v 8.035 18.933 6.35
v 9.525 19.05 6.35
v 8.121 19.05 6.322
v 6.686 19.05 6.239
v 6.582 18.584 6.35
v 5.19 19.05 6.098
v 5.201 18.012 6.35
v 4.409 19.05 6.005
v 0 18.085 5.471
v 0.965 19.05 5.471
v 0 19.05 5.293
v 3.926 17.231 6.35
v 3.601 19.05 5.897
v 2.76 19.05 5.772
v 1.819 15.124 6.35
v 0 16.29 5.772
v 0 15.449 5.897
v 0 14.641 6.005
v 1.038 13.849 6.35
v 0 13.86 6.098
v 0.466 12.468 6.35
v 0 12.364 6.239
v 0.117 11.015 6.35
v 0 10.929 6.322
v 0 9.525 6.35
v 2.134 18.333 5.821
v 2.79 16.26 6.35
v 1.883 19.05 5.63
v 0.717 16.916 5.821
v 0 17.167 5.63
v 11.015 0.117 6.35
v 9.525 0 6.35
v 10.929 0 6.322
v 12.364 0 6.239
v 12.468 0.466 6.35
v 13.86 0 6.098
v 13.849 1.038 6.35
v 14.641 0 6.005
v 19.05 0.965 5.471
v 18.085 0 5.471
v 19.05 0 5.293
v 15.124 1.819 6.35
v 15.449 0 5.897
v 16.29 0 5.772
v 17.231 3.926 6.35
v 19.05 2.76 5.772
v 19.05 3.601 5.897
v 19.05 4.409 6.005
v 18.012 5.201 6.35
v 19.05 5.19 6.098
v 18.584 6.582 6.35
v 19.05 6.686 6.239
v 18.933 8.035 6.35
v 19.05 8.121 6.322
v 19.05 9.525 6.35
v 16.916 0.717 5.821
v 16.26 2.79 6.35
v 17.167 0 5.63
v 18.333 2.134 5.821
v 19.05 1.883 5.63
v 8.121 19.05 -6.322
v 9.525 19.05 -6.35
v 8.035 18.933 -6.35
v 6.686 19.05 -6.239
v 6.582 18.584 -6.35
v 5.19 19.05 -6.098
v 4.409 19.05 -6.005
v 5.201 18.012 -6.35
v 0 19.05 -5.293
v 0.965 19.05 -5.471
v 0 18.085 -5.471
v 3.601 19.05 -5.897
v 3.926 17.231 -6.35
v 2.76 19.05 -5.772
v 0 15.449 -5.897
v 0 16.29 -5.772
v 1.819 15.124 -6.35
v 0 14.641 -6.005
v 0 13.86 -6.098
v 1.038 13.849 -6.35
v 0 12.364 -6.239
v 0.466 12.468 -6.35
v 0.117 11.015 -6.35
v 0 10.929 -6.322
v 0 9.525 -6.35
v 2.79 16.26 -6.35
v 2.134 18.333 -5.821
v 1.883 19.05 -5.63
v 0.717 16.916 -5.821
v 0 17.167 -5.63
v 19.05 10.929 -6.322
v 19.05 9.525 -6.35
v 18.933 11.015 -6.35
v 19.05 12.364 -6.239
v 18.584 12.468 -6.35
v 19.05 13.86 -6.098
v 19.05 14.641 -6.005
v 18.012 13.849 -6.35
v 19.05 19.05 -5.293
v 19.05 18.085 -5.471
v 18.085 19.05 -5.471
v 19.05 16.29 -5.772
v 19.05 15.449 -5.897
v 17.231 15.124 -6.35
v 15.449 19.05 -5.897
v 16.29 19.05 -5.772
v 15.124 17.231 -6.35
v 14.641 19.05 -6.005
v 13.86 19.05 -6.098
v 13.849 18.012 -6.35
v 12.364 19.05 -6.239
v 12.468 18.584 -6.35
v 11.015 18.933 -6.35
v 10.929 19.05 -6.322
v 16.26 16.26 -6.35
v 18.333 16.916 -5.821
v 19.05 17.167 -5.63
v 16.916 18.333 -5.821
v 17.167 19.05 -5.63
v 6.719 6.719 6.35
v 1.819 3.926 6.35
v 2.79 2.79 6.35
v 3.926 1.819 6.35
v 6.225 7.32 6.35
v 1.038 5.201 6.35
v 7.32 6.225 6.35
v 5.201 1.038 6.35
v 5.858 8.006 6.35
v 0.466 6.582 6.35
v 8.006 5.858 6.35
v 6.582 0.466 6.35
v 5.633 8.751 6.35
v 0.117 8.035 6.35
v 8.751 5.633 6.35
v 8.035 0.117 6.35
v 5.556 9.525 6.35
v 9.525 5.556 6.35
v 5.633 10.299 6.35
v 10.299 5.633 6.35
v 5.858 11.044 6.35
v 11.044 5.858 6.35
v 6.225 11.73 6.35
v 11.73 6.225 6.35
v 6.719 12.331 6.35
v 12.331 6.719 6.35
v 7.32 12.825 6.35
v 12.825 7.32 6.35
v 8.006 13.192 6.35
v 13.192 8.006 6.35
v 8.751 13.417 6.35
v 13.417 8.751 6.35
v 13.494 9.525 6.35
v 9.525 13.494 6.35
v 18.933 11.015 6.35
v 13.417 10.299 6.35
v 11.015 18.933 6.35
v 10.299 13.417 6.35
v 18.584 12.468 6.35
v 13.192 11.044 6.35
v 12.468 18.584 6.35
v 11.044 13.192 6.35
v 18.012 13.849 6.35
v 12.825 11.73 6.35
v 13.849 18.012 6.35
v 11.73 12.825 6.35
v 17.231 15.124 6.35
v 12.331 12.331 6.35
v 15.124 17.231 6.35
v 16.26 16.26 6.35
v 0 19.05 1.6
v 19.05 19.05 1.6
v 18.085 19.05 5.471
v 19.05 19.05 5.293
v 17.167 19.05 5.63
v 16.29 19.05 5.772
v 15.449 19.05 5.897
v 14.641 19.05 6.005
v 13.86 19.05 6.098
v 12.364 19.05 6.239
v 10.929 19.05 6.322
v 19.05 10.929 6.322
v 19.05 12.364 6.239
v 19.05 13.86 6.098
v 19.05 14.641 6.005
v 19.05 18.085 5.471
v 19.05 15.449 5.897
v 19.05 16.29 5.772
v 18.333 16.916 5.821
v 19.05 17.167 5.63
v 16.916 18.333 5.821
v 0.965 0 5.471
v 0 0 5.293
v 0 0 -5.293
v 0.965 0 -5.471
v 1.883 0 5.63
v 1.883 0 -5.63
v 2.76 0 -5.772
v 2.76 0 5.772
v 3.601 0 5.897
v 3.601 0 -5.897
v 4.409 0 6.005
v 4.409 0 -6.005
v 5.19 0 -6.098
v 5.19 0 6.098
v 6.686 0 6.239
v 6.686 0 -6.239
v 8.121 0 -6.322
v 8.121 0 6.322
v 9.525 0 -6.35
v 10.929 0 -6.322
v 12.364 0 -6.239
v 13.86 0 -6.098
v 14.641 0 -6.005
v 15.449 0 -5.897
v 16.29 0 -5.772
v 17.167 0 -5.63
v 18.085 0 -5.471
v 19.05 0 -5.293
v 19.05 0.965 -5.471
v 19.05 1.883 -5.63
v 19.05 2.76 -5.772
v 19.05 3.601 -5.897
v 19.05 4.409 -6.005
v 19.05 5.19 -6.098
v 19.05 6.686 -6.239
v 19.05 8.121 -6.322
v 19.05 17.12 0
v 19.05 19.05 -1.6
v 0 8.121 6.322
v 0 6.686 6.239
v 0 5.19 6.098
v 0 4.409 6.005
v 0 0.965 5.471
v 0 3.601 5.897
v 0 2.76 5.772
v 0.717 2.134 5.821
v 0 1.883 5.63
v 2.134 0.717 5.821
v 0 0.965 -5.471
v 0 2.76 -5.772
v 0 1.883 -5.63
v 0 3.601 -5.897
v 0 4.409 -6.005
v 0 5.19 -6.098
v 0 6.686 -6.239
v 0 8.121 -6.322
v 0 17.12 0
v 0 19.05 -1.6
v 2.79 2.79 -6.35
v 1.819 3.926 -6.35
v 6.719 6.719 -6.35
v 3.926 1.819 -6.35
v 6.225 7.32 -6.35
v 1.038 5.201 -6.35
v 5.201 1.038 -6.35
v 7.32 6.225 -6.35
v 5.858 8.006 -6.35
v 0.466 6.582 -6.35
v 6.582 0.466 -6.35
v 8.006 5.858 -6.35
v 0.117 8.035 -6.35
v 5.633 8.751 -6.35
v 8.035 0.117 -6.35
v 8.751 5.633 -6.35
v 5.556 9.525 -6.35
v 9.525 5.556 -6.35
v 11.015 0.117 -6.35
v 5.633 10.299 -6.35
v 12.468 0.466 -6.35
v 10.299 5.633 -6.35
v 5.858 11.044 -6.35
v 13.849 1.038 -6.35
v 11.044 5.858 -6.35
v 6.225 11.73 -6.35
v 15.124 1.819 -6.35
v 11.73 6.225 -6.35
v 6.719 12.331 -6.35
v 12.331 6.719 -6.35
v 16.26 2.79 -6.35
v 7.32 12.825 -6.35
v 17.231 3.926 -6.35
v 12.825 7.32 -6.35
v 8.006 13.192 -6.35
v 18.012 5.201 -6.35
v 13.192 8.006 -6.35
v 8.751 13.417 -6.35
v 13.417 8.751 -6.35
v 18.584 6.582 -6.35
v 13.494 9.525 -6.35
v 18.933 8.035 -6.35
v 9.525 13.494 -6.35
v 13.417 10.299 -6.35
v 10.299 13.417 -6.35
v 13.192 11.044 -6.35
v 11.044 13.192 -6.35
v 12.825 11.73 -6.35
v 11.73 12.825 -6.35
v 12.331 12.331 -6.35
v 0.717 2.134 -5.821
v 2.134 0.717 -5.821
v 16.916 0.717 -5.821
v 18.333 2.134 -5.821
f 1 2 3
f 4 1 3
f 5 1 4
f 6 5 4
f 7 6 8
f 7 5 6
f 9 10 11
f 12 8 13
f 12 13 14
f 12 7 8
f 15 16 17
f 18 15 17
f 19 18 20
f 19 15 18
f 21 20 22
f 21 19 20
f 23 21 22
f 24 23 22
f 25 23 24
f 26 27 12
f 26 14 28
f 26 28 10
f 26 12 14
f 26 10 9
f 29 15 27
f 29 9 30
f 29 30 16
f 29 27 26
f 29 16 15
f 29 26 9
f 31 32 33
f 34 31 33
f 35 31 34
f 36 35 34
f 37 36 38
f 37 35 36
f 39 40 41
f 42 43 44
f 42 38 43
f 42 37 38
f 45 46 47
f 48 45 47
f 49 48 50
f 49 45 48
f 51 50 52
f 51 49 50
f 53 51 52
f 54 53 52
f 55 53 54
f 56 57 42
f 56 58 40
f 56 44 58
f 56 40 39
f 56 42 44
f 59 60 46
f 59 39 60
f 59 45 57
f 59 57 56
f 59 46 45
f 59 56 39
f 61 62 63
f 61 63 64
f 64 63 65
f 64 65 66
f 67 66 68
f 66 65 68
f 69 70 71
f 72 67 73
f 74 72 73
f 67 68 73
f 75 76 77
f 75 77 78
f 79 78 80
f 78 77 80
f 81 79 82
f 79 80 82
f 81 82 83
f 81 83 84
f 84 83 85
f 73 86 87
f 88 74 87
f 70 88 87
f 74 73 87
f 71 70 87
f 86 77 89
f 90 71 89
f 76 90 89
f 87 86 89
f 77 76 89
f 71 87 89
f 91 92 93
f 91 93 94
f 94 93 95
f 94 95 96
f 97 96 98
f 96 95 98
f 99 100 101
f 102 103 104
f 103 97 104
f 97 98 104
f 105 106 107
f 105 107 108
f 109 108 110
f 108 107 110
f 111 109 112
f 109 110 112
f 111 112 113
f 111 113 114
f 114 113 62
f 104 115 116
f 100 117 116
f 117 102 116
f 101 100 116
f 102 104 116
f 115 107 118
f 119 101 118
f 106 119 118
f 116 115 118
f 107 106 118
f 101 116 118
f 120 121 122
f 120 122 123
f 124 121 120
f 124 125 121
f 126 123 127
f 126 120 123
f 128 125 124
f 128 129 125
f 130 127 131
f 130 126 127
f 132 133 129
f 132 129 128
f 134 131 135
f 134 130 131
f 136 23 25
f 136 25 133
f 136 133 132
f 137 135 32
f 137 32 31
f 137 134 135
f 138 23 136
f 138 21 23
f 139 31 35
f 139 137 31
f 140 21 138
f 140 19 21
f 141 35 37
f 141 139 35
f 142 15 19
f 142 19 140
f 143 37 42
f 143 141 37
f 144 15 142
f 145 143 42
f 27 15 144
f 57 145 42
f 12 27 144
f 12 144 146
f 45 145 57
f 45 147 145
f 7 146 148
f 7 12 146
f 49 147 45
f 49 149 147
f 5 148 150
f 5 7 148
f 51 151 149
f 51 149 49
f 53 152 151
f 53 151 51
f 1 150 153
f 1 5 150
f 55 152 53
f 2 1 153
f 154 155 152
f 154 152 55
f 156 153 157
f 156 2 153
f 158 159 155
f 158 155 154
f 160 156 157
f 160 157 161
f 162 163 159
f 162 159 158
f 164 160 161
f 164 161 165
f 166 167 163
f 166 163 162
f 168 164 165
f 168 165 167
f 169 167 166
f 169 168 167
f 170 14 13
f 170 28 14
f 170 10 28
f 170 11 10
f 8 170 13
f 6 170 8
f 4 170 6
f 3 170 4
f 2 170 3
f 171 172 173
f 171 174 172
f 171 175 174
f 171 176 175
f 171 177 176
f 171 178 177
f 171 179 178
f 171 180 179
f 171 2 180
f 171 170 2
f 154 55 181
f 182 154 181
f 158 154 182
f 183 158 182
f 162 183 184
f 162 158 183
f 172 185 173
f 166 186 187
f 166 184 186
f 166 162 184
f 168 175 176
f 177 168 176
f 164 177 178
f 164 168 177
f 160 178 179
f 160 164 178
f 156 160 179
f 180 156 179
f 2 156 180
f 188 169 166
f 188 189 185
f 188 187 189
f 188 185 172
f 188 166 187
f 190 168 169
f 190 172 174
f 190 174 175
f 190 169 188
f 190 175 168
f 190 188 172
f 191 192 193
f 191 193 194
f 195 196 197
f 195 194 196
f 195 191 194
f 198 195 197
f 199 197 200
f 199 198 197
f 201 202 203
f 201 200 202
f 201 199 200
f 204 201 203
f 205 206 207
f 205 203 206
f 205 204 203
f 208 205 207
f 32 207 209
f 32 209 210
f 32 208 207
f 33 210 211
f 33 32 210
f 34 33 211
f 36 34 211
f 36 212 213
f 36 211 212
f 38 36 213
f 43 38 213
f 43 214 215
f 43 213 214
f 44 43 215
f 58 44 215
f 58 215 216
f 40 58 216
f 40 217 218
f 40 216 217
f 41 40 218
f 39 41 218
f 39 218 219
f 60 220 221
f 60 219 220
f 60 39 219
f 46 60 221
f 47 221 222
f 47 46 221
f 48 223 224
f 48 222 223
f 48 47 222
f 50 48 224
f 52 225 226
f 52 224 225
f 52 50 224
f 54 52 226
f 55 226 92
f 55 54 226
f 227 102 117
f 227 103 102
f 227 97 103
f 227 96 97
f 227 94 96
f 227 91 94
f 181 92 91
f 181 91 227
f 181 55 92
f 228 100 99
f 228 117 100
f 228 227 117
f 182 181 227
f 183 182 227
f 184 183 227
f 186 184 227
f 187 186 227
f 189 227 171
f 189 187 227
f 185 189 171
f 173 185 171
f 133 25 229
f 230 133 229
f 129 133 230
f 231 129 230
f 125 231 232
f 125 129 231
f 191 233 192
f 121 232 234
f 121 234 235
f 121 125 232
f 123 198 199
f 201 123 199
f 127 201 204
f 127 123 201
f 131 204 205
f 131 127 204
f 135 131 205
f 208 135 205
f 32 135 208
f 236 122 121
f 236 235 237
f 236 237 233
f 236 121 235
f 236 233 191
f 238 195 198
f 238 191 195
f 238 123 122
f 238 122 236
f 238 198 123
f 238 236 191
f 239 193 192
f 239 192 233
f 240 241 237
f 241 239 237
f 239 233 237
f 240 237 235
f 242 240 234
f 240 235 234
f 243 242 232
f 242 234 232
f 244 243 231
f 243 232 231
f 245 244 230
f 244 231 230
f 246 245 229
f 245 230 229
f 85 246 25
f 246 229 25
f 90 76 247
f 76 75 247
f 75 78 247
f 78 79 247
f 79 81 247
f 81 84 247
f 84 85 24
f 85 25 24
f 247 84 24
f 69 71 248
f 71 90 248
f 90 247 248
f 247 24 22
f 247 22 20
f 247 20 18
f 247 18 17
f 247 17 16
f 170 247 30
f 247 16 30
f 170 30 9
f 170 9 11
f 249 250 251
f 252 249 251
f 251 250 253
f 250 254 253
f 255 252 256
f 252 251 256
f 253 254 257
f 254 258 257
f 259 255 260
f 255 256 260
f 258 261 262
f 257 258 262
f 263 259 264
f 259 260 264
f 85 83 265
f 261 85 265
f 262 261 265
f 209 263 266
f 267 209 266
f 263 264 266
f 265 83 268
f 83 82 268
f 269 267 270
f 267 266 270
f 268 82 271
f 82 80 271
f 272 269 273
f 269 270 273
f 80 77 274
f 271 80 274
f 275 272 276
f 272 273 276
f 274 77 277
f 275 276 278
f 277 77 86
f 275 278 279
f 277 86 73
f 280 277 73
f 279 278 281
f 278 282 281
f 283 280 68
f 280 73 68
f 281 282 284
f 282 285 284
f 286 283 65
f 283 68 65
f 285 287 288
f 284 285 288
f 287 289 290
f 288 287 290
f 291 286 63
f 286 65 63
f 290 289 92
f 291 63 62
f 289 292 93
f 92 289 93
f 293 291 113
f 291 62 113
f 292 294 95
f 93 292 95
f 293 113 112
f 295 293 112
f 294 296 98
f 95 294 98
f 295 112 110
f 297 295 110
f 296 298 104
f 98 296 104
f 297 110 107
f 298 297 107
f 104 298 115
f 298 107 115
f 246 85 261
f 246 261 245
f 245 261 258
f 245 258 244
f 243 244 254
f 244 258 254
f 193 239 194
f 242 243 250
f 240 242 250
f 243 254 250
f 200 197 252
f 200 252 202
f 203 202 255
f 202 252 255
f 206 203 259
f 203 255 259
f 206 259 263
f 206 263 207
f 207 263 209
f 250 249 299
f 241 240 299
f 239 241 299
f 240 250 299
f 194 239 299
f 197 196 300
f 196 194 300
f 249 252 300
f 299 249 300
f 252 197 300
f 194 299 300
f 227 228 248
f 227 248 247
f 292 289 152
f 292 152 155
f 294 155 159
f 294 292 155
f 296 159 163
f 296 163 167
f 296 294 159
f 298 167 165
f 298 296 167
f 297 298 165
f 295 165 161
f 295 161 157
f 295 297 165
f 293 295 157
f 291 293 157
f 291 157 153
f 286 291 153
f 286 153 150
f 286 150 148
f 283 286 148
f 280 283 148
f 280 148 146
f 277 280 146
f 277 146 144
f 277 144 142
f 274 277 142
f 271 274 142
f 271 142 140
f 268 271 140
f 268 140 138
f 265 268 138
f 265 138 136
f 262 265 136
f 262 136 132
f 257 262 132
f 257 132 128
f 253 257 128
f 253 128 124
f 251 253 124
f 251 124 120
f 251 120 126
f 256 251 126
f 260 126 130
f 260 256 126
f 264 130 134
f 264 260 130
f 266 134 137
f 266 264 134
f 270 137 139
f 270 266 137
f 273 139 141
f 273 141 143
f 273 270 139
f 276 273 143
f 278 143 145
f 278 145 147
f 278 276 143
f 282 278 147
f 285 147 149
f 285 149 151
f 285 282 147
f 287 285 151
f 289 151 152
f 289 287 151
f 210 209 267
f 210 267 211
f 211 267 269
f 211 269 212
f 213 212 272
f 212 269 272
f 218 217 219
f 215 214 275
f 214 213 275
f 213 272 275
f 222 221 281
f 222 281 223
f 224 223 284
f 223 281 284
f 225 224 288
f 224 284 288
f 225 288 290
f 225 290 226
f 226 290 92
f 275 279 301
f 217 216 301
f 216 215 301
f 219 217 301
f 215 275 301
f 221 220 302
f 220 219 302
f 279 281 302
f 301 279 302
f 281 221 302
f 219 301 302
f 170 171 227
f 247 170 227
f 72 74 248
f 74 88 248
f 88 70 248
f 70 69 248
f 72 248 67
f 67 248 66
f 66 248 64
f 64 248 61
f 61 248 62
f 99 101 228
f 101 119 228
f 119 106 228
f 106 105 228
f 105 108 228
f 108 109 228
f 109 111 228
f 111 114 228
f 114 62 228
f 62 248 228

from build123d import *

# Parameters (mm, degrees)
F0_W     = 19.05
F0_H     = 19.05
F1_DEPTH = 6.35
F2_R     = 3.96875
F3_DEPTH = 12.7
F6_DEPTH = 19.05


with BuildPart() as f1:
    # F0 (on Top) → F1 (new body)
    with BuildSketch(Plane.XY):
        with Locations((9.525, 9.525)):
            Rectangle(F0_W, F0_H)
    extrude(amount=F1_DEPTH)

    # F2 (on face) → F3 (cut)
    with BuildSketch(Plane.XY.offset(6.35)):
        with Locations((9.525, 9.525)):
            Circle(F2_R)
    extrude(amount=-F3_DEPTH, mode=Mode.SUBTRACT)

    # F5 (on face) → F6 (cut)
    with BuildSketch(Plane.YZ.offset(19.05)):
        Polygon((17.1196, 0), (19.05, 0), (19.05, 1.6002), align=None)
    extrude(amount=-F6_DEPTH, mode=Mode.SUBTRACT)

    # F9: sweep along a path in F4
    with BuildLine(Plane.XY.offset(6.35)) as f9_path:
        CenterArc((9.525, 9.525), 9.525, 0, 360)
    # F8 (on mid) → F9 (sweep, cut)
    with BuildSketch(Plane(origin=(9.525, 0, 0), x_dir=(0, -1, 0), z_dir=(-1, 0, 0))):
        Polygon((-28.4483358264, 3.8317235051), (-19.05, 6.35), (-28.4483358264, 6.35), align=None)
    sweep(path=f9_path.line, mode=Mode.SUBTRACT)

    # F10: F1 across face


with BuildPart() as f1_1:
    add(f1.part)
    add(f1.part.mirror(Plane(origin=(9.525, 8.3871560005, 0), x_dir=(1, 0, 0), z_dir=(0, 0, -1))))


solid = f1_1.part
